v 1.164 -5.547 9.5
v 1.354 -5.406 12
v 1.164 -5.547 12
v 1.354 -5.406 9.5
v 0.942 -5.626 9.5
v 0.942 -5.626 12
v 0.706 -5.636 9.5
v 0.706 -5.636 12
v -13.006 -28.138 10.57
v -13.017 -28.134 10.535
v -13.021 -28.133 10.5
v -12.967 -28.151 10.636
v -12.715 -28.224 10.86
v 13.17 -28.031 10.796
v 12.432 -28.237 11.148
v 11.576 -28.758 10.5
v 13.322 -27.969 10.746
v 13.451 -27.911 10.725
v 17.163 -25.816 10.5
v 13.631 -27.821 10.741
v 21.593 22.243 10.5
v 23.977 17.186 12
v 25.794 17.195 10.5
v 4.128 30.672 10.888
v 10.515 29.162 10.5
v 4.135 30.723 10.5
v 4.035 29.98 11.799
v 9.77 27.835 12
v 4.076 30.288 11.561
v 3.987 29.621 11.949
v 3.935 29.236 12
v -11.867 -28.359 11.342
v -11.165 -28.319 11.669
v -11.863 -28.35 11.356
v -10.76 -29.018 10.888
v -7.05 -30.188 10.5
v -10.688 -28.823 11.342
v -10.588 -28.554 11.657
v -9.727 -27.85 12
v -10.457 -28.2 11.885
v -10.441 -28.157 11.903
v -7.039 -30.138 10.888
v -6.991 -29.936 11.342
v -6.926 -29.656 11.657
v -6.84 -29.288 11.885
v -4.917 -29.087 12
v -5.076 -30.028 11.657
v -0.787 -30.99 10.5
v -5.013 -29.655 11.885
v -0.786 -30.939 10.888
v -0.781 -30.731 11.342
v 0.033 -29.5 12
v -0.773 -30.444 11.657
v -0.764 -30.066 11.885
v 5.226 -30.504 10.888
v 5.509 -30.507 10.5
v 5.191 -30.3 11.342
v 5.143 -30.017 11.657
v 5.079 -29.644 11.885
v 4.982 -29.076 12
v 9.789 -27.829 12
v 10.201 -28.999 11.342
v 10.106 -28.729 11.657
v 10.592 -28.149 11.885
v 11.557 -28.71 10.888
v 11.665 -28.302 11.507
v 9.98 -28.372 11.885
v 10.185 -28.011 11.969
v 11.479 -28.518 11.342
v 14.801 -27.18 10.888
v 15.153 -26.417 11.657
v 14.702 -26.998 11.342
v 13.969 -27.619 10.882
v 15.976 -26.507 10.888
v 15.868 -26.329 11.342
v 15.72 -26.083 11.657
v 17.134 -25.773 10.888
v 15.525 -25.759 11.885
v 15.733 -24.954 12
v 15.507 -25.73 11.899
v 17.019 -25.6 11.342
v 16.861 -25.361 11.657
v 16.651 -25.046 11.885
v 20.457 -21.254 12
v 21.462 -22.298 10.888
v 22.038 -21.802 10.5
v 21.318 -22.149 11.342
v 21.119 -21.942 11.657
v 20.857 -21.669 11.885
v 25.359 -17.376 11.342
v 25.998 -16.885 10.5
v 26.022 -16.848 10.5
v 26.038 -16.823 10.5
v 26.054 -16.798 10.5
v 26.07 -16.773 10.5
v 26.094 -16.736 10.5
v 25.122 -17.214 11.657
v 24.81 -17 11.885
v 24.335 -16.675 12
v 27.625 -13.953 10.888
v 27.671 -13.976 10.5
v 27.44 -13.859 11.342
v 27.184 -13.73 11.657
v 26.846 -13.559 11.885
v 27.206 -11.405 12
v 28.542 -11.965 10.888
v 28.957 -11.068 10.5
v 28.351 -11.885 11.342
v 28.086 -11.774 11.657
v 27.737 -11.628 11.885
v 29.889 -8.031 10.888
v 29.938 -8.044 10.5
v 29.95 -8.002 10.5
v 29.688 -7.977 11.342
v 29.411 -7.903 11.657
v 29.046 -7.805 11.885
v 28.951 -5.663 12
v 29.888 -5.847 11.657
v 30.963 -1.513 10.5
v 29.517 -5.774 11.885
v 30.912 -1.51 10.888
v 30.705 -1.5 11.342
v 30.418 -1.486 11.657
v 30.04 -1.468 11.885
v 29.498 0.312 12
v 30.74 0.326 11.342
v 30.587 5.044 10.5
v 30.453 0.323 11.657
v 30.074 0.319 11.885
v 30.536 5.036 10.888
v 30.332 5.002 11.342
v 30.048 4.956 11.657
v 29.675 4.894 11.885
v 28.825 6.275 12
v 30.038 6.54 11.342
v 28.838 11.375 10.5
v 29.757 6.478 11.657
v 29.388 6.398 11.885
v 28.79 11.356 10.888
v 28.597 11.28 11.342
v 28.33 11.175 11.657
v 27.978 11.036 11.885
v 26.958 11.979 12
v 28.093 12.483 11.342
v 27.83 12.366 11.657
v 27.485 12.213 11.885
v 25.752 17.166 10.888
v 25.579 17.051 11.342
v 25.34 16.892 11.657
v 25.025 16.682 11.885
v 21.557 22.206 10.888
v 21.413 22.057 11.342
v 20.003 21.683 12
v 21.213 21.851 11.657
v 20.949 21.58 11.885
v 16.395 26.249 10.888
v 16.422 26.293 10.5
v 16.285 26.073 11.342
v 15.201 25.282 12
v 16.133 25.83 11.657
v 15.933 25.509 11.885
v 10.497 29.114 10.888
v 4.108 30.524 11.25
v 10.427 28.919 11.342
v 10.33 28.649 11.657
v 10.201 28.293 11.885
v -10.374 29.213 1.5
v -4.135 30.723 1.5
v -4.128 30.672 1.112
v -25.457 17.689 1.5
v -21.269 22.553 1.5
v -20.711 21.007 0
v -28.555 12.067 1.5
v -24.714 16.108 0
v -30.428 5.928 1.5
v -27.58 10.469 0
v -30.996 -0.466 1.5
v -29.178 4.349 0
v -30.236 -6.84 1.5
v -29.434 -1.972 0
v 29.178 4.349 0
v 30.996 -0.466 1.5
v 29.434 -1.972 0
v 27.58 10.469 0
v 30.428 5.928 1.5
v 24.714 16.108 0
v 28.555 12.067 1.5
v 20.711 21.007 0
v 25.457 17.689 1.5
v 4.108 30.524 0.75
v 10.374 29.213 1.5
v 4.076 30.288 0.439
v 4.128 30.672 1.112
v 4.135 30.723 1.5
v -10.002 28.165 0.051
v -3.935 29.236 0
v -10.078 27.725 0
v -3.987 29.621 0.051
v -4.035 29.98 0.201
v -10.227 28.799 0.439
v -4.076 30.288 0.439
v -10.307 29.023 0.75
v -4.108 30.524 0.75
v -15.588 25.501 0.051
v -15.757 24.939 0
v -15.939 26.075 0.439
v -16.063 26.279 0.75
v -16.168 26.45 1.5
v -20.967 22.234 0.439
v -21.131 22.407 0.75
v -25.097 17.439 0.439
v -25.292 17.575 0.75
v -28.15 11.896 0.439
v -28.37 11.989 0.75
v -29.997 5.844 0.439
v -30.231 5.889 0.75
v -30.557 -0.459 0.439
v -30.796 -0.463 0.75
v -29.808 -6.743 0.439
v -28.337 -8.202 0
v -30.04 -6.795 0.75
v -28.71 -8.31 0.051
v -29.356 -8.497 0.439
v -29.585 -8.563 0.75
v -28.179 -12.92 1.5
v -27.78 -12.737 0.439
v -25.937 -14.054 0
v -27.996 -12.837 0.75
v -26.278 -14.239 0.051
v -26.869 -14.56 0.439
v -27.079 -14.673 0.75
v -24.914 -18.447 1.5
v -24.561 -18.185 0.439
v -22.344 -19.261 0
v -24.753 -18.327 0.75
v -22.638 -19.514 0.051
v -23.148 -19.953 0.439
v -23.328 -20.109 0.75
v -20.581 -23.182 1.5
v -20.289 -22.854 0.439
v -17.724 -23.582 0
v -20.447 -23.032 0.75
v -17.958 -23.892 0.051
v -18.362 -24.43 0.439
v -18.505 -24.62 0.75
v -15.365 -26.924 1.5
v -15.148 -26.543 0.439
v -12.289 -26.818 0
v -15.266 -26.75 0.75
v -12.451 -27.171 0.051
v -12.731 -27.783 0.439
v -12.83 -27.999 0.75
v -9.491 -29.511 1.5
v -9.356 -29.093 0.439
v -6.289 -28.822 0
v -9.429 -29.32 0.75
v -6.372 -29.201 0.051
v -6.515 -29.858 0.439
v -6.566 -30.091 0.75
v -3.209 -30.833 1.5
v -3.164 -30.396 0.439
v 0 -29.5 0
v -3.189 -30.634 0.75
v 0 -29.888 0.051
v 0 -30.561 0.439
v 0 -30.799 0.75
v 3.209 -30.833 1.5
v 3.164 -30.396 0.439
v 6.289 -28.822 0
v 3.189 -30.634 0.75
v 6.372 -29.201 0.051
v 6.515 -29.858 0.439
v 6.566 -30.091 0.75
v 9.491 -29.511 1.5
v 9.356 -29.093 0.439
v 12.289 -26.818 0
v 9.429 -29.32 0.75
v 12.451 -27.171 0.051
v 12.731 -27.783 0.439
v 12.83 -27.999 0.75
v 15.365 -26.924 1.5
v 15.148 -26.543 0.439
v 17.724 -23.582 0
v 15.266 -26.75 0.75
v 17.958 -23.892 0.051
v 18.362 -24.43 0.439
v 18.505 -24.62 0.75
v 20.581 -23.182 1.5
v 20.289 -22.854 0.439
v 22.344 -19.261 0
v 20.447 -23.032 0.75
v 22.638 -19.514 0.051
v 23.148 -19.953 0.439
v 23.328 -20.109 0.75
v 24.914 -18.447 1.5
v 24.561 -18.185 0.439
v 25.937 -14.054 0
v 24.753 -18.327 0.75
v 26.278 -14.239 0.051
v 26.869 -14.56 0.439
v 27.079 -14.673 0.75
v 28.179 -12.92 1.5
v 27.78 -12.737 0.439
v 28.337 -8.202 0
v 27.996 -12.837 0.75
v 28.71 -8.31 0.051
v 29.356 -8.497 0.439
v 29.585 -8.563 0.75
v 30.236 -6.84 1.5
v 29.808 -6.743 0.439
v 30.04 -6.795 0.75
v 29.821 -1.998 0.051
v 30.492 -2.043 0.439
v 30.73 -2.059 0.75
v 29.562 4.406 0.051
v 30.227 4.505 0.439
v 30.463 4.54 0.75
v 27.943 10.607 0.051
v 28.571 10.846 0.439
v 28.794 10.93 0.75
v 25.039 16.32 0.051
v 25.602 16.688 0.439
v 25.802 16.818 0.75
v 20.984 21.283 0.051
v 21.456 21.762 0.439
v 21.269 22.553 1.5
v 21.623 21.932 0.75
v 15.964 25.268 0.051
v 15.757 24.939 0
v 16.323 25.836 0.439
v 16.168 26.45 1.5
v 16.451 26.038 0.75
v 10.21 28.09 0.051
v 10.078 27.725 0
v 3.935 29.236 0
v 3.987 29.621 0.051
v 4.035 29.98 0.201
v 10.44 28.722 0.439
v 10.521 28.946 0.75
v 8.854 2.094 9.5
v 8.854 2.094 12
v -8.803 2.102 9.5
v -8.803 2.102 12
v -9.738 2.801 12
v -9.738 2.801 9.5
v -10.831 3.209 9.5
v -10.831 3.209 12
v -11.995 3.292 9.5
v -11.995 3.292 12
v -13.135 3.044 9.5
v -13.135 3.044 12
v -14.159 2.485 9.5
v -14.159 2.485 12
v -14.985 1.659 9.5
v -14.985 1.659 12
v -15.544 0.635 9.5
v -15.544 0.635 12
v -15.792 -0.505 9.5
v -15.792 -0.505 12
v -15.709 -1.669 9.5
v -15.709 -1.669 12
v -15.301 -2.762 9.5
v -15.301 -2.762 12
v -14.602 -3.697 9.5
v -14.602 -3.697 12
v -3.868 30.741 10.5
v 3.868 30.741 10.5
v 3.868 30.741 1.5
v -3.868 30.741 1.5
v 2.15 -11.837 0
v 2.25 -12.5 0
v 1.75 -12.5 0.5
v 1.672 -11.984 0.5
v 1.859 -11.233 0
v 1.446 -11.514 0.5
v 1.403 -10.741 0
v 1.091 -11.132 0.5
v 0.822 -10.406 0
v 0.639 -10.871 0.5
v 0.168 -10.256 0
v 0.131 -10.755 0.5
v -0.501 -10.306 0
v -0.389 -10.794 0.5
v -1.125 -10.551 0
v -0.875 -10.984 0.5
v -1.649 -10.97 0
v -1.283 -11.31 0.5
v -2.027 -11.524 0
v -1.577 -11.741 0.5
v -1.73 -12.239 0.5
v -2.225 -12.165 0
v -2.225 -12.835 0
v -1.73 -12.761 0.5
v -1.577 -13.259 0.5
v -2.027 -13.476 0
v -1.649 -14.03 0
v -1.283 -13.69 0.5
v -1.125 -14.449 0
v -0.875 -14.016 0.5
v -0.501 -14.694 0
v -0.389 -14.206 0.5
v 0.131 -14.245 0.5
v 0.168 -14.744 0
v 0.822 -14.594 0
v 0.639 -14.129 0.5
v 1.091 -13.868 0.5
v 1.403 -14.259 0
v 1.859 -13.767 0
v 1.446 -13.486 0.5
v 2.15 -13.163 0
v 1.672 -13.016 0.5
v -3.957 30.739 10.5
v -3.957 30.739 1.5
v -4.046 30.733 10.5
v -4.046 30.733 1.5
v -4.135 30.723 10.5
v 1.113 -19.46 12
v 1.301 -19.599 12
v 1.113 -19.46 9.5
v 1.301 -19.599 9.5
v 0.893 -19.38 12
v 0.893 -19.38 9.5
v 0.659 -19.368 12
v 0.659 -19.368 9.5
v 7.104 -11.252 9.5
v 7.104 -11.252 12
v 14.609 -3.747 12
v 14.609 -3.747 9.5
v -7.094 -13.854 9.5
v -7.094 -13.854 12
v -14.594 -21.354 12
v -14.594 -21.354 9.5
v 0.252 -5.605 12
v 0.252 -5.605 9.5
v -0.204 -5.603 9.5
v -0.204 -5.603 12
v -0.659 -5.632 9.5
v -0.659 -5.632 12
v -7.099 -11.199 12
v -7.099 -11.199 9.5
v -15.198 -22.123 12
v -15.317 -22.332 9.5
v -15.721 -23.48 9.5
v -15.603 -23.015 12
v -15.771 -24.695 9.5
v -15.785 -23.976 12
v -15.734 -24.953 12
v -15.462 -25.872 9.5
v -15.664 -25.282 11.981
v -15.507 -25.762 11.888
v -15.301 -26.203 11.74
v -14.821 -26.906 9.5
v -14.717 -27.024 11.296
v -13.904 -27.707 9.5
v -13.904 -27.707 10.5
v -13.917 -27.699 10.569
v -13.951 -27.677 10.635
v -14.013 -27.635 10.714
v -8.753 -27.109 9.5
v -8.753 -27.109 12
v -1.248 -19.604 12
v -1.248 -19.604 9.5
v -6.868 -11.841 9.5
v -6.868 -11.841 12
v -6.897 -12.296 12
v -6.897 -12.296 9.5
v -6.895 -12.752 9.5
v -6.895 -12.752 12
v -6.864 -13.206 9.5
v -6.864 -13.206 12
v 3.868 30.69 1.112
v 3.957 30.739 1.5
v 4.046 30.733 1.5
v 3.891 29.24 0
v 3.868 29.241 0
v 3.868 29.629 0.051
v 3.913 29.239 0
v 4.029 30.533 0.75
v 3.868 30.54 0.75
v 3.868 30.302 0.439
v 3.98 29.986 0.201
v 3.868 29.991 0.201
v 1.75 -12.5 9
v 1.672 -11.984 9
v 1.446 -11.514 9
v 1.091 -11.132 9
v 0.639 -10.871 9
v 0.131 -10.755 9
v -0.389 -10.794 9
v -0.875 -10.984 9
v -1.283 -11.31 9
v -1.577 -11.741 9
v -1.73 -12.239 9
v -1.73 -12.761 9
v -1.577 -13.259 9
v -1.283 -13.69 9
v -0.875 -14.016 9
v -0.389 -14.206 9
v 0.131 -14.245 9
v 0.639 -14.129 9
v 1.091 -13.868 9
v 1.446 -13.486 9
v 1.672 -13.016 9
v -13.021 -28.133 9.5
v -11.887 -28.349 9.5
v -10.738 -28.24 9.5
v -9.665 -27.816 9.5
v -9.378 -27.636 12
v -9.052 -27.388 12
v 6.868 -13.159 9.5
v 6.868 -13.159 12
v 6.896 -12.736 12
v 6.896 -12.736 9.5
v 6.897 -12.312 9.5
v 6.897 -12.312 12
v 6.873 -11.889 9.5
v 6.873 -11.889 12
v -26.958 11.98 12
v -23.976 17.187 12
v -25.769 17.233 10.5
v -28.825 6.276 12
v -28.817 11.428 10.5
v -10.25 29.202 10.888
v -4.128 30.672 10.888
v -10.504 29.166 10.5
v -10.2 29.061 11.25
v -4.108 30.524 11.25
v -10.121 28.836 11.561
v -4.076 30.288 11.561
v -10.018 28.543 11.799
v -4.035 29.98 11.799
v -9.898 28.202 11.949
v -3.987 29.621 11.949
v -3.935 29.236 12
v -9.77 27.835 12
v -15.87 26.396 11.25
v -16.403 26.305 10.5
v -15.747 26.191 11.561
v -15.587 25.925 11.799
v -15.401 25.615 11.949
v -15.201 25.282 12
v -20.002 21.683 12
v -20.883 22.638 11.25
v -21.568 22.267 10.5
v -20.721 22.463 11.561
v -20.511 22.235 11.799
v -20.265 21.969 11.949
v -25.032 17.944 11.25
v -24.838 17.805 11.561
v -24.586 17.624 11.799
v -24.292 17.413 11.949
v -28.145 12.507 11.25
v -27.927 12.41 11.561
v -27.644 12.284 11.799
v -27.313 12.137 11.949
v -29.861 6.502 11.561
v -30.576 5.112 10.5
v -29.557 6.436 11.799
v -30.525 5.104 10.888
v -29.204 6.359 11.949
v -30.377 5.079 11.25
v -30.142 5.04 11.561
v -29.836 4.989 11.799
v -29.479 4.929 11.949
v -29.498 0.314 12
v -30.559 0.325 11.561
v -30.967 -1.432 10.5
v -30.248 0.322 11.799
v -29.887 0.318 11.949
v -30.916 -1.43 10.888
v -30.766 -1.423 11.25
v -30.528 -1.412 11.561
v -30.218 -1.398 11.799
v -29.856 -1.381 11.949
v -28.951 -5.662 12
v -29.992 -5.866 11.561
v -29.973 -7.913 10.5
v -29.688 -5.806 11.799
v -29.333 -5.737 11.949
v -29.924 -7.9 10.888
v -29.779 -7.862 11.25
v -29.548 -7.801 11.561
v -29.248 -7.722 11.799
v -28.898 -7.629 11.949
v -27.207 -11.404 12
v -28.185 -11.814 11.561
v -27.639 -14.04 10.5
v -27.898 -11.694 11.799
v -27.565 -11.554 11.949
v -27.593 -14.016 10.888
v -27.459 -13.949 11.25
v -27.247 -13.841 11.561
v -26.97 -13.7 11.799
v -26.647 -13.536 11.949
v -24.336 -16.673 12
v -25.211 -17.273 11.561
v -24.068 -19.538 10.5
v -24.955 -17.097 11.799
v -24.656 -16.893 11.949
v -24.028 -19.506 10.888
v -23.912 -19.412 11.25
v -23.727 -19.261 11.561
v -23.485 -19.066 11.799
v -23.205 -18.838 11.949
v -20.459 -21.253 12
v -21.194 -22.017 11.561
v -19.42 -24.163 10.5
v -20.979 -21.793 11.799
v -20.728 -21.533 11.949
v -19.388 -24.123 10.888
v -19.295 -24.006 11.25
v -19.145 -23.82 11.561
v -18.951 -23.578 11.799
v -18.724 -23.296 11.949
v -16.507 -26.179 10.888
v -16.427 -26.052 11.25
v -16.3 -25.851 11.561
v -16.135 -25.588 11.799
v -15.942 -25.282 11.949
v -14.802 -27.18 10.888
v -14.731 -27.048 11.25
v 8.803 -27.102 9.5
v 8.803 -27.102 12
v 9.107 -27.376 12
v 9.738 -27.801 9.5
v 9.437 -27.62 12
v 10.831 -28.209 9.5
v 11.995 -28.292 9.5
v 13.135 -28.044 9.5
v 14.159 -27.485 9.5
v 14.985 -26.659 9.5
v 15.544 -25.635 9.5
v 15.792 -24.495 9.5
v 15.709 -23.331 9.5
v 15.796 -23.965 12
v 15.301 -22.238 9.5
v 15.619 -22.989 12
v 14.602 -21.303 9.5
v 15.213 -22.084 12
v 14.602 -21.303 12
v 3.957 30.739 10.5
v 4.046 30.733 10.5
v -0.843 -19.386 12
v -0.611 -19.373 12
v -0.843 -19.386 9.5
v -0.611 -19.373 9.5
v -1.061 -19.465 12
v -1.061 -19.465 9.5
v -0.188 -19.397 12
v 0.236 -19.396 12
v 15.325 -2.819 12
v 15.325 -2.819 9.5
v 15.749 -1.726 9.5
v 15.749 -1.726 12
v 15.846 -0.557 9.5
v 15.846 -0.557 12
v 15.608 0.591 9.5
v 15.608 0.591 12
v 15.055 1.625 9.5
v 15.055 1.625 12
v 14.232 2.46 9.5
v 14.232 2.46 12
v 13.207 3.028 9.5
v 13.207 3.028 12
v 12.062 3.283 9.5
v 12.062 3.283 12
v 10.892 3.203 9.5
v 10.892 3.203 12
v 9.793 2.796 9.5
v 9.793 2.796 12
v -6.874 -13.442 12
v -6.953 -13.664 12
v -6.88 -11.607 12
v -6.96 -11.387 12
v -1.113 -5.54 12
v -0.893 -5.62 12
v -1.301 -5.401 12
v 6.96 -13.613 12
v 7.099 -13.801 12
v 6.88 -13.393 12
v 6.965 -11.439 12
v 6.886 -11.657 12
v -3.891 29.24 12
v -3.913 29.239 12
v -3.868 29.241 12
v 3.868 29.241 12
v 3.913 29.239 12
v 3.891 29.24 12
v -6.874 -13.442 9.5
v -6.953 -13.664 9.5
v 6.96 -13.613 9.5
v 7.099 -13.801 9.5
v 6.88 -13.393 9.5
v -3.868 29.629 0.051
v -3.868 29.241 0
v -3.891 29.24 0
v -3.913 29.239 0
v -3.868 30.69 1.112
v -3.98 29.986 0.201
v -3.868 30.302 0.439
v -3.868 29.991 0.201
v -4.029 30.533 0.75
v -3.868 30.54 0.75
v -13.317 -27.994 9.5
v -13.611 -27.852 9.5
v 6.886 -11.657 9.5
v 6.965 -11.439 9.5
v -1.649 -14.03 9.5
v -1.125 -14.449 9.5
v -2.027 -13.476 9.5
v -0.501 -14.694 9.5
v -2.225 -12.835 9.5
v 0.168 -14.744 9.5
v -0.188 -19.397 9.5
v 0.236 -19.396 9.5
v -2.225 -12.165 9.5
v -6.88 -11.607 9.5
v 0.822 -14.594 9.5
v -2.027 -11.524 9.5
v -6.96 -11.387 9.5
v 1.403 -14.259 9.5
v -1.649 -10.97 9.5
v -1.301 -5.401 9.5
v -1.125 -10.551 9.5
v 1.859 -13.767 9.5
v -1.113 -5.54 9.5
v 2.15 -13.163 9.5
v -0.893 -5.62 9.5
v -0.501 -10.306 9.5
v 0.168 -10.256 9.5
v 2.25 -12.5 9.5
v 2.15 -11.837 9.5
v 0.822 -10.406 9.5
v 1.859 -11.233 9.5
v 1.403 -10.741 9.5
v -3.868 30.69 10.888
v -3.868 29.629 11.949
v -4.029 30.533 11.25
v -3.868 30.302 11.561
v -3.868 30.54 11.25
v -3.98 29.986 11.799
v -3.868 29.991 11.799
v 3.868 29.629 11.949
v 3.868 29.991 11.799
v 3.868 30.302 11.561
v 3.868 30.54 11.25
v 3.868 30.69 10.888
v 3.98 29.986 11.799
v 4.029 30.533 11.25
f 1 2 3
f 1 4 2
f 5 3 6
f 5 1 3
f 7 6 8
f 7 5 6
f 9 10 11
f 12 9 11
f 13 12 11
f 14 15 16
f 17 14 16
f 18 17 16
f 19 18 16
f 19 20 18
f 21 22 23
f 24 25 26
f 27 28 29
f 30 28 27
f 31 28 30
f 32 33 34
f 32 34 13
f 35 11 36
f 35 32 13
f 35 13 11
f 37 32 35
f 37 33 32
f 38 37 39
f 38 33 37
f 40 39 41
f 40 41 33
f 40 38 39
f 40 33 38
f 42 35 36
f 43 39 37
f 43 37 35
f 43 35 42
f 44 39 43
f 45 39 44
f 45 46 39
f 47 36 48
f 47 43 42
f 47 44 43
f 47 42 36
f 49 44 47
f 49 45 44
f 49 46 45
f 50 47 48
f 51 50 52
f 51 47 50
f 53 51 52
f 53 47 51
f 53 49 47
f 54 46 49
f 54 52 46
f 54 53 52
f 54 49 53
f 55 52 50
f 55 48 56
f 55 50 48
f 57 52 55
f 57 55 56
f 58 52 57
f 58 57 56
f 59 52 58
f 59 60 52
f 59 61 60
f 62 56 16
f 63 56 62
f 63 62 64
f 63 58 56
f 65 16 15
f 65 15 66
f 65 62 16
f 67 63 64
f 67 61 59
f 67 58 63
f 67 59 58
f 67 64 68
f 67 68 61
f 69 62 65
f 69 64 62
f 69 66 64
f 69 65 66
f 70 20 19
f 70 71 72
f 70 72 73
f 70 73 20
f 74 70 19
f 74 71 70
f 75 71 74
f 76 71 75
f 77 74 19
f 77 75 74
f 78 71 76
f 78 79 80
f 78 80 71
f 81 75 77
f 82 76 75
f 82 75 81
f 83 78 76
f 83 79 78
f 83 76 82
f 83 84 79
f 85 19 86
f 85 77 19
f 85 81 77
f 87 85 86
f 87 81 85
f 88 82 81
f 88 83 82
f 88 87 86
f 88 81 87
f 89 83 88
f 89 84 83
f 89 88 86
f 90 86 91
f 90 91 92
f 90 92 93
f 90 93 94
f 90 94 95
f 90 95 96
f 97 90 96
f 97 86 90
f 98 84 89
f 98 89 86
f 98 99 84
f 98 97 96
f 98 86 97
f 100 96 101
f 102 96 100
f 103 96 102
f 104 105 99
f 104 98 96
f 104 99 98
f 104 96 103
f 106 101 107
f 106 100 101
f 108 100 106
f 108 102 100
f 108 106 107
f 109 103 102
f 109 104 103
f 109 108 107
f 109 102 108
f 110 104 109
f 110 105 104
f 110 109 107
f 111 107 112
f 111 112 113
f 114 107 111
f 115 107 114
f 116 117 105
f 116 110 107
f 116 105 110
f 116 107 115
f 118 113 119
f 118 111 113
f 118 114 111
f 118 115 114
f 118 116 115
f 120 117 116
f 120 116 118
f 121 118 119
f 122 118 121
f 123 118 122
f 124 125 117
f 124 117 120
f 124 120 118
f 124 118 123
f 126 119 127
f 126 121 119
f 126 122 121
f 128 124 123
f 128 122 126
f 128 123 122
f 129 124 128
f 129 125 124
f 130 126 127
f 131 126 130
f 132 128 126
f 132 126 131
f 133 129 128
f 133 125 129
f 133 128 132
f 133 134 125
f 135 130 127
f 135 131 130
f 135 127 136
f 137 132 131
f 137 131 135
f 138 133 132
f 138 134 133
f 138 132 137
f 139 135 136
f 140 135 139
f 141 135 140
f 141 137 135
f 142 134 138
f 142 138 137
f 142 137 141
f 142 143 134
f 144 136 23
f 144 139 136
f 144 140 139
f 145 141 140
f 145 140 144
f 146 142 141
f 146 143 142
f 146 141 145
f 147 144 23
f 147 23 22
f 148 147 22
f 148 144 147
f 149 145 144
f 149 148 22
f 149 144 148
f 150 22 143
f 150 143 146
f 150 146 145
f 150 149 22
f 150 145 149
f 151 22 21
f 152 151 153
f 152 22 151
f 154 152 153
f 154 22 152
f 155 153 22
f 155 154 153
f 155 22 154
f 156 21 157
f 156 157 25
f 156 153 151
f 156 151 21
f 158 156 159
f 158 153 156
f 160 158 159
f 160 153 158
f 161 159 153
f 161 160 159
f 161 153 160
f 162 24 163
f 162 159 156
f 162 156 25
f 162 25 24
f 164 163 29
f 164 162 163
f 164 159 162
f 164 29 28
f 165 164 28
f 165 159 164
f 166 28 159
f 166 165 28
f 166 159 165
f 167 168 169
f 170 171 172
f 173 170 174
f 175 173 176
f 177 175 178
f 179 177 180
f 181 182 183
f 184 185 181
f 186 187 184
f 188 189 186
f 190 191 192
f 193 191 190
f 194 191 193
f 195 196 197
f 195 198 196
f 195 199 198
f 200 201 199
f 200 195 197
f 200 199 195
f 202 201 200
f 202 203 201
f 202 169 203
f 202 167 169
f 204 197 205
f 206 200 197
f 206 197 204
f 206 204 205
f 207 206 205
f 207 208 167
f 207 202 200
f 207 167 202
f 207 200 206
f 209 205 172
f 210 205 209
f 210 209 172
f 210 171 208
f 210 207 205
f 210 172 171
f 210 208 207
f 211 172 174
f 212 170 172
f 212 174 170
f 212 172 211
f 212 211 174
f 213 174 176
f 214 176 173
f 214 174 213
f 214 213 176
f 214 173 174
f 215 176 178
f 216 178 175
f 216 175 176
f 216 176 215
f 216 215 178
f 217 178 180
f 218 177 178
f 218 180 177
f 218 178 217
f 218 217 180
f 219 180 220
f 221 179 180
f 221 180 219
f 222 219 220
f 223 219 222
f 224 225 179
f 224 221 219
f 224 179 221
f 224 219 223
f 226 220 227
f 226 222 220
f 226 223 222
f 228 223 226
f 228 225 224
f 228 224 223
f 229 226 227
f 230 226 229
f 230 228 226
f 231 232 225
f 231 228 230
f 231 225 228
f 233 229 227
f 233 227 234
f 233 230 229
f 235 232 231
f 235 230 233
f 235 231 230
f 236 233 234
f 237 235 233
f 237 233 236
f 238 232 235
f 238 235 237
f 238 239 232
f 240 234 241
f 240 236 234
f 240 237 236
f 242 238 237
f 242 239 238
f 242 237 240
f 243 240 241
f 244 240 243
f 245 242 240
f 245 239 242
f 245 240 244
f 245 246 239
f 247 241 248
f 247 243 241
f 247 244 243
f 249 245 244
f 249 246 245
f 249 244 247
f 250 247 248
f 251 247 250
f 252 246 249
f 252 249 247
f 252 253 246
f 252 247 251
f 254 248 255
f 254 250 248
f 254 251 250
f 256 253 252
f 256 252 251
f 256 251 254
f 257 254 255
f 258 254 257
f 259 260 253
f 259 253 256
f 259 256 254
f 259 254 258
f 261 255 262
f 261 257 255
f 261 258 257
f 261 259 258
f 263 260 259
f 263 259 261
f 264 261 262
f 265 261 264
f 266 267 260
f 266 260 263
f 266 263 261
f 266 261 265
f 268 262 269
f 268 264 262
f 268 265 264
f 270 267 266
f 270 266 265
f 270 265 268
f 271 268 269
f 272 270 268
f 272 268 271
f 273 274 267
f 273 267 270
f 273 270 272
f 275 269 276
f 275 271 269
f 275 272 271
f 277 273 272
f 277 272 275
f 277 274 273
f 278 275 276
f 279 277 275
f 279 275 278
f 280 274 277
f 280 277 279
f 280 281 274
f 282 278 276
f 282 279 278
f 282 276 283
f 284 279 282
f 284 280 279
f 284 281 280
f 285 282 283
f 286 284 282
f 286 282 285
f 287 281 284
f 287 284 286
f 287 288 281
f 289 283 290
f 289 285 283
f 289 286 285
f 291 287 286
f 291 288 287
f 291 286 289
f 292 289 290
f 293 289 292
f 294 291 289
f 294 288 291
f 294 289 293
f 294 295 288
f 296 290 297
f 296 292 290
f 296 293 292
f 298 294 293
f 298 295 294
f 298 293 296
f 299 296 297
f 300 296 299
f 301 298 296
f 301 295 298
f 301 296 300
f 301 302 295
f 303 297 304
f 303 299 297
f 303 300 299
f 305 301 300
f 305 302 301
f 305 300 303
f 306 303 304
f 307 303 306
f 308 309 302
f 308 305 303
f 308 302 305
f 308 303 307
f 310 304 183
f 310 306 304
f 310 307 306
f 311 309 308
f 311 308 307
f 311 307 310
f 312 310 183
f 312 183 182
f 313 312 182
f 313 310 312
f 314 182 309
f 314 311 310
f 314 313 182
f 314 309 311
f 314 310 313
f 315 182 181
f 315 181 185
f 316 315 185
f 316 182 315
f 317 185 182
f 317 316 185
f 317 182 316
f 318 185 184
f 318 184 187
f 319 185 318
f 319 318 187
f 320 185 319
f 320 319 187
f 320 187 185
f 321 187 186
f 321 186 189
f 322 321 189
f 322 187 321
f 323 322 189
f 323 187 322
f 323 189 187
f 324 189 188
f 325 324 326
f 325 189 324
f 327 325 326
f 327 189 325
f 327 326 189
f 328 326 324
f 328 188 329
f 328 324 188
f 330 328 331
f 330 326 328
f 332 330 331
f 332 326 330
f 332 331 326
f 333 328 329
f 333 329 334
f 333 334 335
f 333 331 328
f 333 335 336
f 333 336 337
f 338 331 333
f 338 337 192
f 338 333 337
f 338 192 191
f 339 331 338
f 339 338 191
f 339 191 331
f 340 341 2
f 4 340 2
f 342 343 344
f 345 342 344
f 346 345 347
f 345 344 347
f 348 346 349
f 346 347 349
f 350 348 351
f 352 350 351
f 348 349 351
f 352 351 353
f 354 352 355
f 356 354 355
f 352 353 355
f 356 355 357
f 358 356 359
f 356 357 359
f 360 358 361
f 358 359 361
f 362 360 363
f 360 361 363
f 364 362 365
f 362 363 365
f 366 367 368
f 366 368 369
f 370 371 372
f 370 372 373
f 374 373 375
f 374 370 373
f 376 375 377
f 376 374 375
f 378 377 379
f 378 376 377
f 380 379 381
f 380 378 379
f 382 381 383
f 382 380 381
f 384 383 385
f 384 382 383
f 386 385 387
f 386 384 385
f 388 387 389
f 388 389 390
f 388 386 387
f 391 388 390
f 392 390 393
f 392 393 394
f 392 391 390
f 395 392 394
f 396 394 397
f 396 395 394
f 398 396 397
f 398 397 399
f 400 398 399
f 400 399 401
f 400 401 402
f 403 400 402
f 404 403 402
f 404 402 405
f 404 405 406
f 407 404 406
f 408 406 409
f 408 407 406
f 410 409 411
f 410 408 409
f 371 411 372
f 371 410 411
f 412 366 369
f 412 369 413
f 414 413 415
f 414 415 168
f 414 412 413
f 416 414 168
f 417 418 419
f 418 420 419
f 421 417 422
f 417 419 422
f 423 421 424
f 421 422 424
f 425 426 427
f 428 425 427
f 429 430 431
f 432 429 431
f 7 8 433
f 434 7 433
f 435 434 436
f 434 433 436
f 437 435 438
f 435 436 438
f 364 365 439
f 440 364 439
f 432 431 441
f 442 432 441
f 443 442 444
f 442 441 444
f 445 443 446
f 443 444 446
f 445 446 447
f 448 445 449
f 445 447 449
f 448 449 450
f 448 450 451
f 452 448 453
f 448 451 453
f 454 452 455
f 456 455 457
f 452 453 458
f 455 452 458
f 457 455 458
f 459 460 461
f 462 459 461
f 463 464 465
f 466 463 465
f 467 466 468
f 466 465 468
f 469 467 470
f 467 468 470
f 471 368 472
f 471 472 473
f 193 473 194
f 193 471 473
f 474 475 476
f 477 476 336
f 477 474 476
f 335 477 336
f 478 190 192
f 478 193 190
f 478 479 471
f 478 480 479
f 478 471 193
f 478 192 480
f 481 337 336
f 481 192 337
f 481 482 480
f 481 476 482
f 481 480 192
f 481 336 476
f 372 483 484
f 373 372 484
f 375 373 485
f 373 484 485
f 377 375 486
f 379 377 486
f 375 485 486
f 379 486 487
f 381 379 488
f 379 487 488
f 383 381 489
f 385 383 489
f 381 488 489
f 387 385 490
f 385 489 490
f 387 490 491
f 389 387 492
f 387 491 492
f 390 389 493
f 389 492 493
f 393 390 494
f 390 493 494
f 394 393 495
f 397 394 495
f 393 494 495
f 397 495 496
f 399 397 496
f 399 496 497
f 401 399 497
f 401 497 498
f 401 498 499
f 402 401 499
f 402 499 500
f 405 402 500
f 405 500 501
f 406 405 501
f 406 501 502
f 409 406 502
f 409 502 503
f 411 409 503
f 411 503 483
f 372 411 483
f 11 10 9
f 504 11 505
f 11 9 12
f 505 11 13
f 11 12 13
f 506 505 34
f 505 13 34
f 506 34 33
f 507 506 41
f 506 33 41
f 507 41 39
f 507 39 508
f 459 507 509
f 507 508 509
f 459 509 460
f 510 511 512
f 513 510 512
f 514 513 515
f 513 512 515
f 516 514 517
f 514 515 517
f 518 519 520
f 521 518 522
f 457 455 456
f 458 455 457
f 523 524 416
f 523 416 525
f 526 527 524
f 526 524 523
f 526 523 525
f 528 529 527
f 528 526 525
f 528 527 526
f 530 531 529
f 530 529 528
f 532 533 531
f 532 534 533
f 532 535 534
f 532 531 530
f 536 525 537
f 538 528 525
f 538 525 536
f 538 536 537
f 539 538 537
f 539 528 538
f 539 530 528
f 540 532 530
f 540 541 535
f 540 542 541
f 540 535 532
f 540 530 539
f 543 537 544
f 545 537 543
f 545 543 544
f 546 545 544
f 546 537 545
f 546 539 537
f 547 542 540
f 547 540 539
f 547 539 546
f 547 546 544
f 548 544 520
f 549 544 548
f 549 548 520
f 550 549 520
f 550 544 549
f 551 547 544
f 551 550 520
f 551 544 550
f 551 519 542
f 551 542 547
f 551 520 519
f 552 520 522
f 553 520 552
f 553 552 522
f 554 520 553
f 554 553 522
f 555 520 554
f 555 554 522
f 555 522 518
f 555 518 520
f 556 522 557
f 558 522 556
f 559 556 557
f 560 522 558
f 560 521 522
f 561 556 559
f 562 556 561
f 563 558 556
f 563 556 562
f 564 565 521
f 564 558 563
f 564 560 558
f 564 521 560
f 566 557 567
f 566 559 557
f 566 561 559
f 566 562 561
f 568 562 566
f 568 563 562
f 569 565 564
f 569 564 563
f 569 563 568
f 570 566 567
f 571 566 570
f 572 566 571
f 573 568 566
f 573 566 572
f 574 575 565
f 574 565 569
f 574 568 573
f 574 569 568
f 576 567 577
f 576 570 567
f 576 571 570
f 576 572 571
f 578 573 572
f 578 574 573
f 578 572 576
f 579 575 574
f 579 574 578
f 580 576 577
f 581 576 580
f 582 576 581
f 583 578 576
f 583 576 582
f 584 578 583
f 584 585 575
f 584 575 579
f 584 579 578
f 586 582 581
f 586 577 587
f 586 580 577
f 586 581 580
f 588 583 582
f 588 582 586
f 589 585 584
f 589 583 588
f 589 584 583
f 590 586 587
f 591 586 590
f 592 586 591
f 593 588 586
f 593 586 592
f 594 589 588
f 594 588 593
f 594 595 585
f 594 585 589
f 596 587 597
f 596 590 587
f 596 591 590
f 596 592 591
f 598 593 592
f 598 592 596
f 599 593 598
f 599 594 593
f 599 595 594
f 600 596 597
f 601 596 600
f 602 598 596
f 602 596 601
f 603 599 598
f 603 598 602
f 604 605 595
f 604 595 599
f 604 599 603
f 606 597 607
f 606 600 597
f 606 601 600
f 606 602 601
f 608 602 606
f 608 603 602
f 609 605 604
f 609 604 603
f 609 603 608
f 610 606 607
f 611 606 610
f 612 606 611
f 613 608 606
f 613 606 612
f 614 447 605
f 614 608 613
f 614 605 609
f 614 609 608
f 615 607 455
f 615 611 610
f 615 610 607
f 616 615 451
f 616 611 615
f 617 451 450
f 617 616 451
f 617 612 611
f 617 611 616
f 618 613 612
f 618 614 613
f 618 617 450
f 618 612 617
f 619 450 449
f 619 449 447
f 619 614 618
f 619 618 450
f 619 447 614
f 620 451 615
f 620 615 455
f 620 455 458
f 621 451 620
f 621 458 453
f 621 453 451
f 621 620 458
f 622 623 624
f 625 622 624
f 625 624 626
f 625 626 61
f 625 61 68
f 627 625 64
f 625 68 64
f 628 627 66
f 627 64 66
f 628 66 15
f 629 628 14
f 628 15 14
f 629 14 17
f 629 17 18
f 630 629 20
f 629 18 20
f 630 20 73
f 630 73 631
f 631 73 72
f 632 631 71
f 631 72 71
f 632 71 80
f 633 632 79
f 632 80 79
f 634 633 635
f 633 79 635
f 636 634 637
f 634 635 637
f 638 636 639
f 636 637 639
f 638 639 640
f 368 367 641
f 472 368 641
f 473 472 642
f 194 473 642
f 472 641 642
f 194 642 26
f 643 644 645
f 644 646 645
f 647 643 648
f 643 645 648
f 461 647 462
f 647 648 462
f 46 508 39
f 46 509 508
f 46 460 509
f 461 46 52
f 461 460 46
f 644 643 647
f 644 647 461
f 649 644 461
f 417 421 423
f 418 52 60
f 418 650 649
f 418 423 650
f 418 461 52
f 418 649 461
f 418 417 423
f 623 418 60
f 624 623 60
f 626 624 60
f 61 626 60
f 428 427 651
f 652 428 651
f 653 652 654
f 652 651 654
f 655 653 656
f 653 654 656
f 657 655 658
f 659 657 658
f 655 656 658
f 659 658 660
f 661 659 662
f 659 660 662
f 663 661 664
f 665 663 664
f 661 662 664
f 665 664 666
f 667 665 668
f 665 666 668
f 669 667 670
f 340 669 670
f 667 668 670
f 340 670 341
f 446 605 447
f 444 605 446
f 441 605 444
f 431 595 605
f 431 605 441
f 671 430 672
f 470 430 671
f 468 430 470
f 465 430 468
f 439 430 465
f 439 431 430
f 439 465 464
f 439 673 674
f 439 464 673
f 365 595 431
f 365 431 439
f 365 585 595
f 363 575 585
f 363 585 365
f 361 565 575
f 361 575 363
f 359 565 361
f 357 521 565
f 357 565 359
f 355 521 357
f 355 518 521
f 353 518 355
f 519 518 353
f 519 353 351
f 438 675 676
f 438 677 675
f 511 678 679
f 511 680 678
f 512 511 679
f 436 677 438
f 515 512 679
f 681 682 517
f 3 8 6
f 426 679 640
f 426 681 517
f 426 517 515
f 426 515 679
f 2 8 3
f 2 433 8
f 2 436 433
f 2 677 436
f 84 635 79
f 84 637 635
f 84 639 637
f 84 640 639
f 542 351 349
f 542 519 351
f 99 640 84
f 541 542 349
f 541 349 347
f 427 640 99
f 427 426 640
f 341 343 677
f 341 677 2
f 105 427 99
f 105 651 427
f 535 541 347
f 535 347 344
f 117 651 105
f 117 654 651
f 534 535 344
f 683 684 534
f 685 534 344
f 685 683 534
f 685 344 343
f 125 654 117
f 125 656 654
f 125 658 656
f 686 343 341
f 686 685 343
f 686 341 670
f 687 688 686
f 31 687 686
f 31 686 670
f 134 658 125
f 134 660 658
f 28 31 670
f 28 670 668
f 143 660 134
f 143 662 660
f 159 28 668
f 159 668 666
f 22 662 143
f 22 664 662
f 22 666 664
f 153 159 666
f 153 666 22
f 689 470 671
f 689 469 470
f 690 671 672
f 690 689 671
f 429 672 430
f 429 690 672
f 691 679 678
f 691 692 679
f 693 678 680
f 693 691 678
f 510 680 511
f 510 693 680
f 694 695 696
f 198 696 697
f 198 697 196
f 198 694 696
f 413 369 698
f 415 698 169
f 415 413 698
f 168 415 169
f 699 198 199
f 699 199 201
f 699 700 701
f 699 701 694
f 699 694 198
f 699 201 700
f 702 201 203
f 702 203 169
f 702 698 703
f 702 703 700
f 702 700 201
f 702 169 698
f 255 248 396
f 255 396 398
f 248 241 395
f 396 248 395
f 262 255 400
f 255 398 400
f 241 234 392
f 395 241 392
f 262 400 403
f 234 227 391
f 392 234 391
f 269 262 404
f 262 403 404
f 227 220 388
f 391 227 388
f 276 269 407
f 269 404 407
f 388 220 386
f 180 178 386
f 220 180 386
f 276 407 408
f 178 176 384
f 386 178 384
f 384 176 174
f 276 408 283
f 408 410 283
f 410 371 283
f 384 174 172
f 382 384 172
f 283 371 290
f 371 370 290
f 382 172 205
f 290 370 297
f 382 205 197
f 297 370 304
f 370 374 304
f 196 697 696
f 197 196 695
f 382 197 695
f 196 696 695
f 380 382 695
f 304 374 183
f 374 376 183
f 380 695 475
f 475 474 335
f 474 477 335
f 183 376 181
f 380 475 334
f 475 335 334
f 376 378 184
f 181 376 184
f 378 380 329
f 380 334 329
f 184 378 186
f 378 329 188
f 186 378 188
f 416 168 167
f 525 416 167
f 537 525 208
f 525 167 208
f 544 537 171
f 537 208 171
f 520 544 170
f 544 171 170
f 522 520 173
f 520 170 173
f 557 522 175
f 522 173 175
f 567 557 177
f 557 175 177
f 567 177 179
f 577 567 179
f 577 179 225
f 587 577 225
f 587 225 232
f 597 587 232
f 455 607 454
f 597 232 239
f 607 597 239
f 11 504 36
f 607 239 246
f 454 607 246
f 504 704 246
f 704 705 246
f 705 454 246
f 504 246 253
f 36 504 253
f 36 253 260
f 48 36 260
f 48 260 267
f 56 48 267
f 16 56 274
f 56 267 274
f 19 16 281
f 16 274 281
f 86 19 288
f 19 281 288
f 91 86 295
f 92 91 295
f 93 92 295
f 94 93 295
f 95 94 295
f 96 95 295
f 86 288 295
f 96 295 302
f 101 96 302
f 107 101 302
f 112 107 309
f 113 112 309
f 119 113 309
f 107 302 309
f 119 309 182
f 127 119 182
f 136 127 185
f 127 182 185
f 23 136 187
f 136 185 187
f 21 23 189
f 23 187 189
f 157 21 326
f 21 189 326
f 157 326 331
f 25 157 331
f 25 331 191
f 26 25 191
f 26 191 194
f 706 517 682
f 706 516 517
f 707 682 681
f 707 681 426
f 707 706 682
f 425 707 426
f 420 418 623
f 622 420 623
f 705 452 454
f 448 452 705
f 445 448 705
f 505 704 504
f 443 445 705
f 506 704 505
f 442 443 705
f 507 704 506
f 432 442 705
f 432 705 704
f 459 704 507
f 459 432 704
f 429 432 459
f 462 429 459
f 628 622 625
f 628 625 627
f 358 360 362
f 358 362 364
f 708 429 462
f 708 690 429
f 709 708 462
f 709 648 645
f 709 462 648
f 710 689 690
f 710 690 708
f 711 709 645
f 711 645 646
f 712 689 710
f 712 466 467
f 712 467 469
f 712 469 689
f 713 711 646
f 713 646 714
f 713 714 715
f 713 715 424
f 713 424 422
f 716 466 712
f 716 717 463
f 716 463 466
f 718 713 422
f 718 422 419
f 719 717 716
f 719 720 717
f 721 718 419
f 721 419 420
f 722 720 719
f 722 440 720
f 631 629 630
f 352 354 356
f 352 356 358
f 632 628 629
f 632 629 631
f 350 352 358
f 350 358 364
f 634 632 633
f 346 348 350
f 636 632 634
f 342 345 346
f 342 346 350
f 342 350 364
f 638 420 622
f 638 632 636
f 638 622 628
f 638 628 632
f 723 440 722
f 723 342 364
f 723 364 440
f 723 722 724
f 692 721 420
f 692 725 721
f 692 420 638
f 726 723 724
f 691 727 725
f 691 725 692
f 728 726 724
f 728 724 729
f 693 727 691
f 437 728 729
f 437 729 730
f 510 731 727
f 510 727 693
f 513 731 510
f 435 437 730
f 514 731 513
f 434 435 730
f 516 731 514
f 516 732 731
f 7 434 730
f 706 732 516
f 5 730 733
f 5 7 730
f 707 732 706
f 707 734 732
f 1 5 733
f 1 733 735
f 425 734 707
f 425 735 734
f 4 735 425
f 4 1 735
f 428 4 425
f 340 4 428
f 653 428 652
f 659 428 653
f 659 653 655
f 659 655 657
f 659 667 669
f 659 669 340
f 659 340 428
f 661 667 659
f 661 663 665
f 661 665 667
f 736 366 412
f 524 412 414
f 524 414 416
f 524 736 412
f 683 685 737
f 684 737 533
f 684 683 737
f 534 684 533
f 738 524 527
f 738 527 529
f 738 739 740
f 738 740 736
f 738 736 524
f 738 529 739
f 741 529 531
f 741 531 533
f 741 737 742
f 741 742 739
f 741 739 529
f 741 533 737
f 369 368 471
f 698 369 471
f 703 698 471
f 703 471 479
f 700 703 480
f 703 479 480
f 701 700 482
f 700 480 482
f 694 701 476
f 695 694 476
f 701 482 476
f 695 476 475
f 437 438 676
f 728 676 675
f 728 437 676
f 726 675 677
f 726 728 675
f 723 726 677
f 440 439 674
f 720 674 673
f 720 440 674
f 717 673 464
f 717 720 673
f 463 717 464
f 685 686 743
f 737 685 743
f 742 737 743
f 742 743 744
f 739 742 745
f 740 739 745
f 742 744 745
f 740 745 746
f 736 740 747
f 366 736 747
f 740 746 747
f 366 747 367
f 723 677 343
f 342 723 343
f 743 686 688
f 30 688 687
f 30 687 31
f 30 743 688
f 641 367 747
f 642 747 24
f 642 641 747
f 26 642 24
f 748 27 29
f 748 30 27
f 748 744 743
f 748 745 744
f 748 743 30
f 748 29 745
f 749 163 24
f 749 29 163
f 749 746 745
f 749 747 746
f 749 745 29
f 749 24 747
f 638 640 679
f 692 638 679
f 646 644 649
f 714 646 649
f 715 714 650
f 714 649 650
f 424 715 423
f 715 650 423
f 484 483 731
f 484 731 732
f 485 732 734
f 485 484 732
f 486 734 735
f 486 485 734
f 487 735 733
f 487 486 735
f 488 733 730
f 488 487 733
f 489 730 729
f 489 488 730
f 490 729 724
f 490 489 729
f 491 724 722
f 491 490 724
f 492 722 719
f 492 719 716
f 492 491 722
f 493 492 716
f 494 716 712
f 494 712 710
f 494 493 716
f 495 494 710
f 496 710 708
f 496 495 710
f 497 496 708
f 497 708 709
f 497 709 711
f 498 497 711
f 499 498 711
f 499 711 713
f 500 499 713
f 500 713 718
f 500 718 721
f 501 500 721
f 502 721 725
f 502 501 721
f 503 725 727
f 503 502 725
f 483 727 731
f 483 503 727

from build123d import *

# Parameters (mm, degrees)
EXTRUDE_1_DEPTH     = 12
SKETCH_2_R          = 1.75
CUT_EXTRUDE_1_DEPTH = 46.453272709
CUT_EXTRUDE_2_DEPTH = 2.5
FILLET_2_R          = 2
FILLET_3_R          = 1.5
FILLET_5_R          = 0.8
CHAMFER_2_SIZE      = 0.5


with BuildPart() as part:
    # 草图1 → 凸台-拉伸1 (new body)
    with BuildSketch(Plane.XY):
        with BuildLine():
            Line((4, 30.740852298), (-4, 30.740852298))
            ThreePointArc((-4, 30.740852298), (0, -31), (4, 30.740852298))
        make_face()
    extrude(amount=EXTRUDE_1_DEPTH)

    # 草图2 → 切除-拉伸1 (cut, through all)
    with BuildSketch(Plane.XY.offset(12)):
        with Locations((0, -12.5)):
            Circle(SKETCH_2_R)
    extrude(amount=-CUT_EXTRUDE_1_DEPTH, mode=Mode.SUBTRACT)

    # 草图4 → 切除-拉伸2 (cut)
    with BuildSketch(Plane.XY.offset(12)):
        with BuildLine():
            Line((14.60159577, -21.303320164), (6.823421177, -13.525145571))
            ThreePointArc((6.823421177, -13.525145571), (6.899952258, -12.525667942), (6.83085934, -11.525648589))
            Line((6.83085934, -11.525648589), (14.609033933, -3.747473996))
            ThreePointArc((14.609033933, -3.747473996), (14.67380701, 2.072232238), (8.853780377, 2.09382366))
            Line((8.853780377, 2.09382366), (1.075605784, -5.684350934))
            ThreePointArc((1.075605784, -5.684350934), (0.025527626, -5.600047222), (-1.025145571, -5.676578823))
            Line((-1.025145571, -5.676578823), (-8.803320164, 2.10159577))
            ThreePointArc((-8.803320164, 2.10159577), (-14.60159577, 2.10159577), (-14.60159577, -3.696679836))
            Line((-14.60159577, -3.696679836), (-6.823421177, -11.474854429))
            ThreePointArc((-6.823421177, -11.474854429), (-6.899952778, -12.525527626), (-6.815649066, -13.575605784))
            Line((-6.815649066, -13.575605784), (-14.59382366, -21.353780377))
            ThreePointArc((-14.59382366, -21.353780377), (-14.572232238, -27.17380701), (-8.752526004, -27.109033933))
            Line((-8.752526004, -27.109033933), (-0.974351411, -19.33085934))
            ThreePointArc((-0.974351411, -19.33085934), (0.025667942, -19.399952258), (1.025145571, -19.323421177))
            Line((1.025145571, -19.323421177), (8.803320164, -27.10159577))
            ThreePointArc((8.803320164, -27.10159577), (14.60159577, -27.10159577), (14.60159577, -21.303320164))
        make_face()
    extrude(amount=-CUT_EXTRUDE_2_DEPTH, mode=Mode.SUBTRACT)

    # 圆角2
    fillet_2_edges = [part.edges().sort_by_distance(p)[0] for p in [
        (-4, 30.740852298, 6),
        (4, 30.740852298, 6),
    ]]
    fillet(fillet_2_edges, radius=FILLET_2_R)

    # 圆角3
    # the kernel refuses this fillet: 1.5 mm, written as the material it takes off along each edge
    with BuildSketch(Plane(origin=(0, 0, 12), x_dir=(-0.5266668059049125, -0.8500718061187049, 0), z_dir=(-0.8500718061187049, 0.5266668059049125, 0))) as fillet_3_piece_1:
        with BuildLine():
            CenterArc((31 - FILLET_3_R, -FILLET_3_R), FILLET_3_R, 0, 90)
            Line((31, -FILLET_3_R), (31, 0))
            Line((31, 0), (31 - FILLET_3_R, 0))
        make_face()
    revolve(axis=Axis((0, 0, 12), (0, 0, 1)), revolution_arc=204.115094482, mode=Mode.SUBTRACT)
    with BuildSketch(Plane(origin=(3.868256609, 30.740852298, 0), x_dir=(0, 0, 1), z_dir=(-1, 0, 0))) as fillet_3_piece_2:
        with BuildLine():
            CenterArc((FILLET_3_R, -FILLET_3_R), FILLET_3_R, 90, 90)
            Line((0, -FILLET_3_R), (0, 0))
            Line((0, 0), (FILLET_3_R, 0))
        make_face()
    extrude(amount=7.736513218, mode=Mode.SUBTRACT)
    with BuildSketch(Plane(origin=(3.868256609, 30.740852298, 12), x_dir=(0, 0, -1), z_dir=(-1, 0, 0))) as fillet_3_piece_3:
        with BuildLine():
            CenterArc((FILLET_3_R, FILLET_3_R), FILLET_3_R, 180, 90)
            Line((0, FILLET_3_R), (0, 0))
            Line((0, 0), (FILLET_3_R, 0))
        make_face()
    extrude(amount=7.736513218, mode=Mode.SUBTRACT)
    with BuildSketch(Plane(origin=(0, 0, 0), x_dir=(-0.1333881589240954, 0.991063872340648, 0), z_dir=(0.991063872340648, 0.1333881589240954, 0))) as fillet_3_piece_4:
        with BuildLine():
            CenterArc((31 - FILLET_3_R, FILLET_3_R), FILLET_3_R, 270, 90)
            Line((31, FILLET_3_R), (31, 0))
            Line((31, 0), (31 - FILLET_3_R, 0))
        make_face()
    revolve(axis=Axis((0, 0, 0), (0, 0, 1)), revolution_arc=344.669149504, mode=Mode.SUBTRACT)
    with BuildSketch(Plane(origin=(-3.868256609, 28.740852298, 0), x_dir=(0, 1, 0), z_dir=(1, 0, 0))) as fillet_3_piece_5:
        with BuildLine():
            CenterArc((2 - FILLET_3_R, FILLET_3_R), FILLET_3_R, 270, 90)
            Line((2, FILLET_3_R), (2, 0))
            Line((2, 0), (2 - FILLET_3_R, 0))
        make_face()
    revolve(axis=Axis((-3.868256609, 28.740852298, 0), (0, 0, 1)), revolution_arc=7.665425248, mode=Mode.SUBTRACT)
    with BuildSketch(Plane(origin=(3.868256609, 28.740852298, 0), x_dir=(0, 1, 0), z_dir=(-1, 0, 0))) as fillet_3_piece_6:
        with BuildLine():
            CenterArc((2 - FILLET_3_R, -FILLET_3_R), FILLET_3_R, 0, 90)
            Line((2, -FILLET_3_R), (2, 0))
            Line((2, 0), (2 - FILLET_3_R, 0))
        make_face()
    revolve(axis=Axis((3.868256609, 28.740852298, 0), (0, 0, -1)), revolution_arc=7.665425248, mode=Mode.SUBTRACT)
    with BuildSketch(Plane(origin=(0, 0, 12), x_dir=(-0.1333881589240954, 0.991063872340648, 0), z_dir=(0.991063872340648, 0.1333881589240954, 0))) as fillet_3_piece_7:
        with BuildLine():
            CenterArc((31 - FILLET_3_R, -FILLET_3_R), FILLET_3_R, 0, 90)
            Line((31, -FILLET_3_R), (31, 0))
            Line((31, 0), (31 - FILLET_3_R, 0))
        make_face()
    revolve(axis=Axis((0, 0, 12), (0, 0, 1)), revolution_arc=152.623466515, mode=Mode.SUBTRACT)
    with BuildSketch(Plane(origin=(-3.868256609, 28.740852298, 12), x_dir=(0, 1, 0), z_dir=(1, 0, 0))) as fillet_3_piece_8:
        with BuildLine():
            CenterArc((2 - FILLET_3_R, -FILLET_3_R), FILLET_3_R, 0, 90)
            Line((2 - FILLET_3_R, 0), (2, 0))
            Line((2, 0), (2, -FILLET_3_R))
        make_face()
    revolve(axis=Axis((-3.868256609, 28.740852298, 12), (0, 0, 1)), revolution_arc=7.665425248, mode=Mode.SUBTRACT)
    with BuildSketch(Plane(origin=(3.868256609, 28.740852298, 12), x_dir=(0, 1, 0), z_dir=(-1, 0, 0))) as fillet_3_piece_9:
        with BuildLine():
            CenterArc((2 - FILLET_3_R, FILLET_3_R), FILLET_3_R, 270, 90)
            Line((2 - FILLET_3_R, 0), (2, 0))
            Line((2, 0), (2, FILLET_3_R))
        make_face()
    revolve(axis=Axis((3.868256609, 28.740852298, 12), (0, 0, -1)), revolution_arc=7.665425248, mode=Mode.SUBTRACT)

    # 圆角5
    fillet_5_edges = [part.edges().sort_by_distance(p)[0] for p in [
        (6.83085934, -11.525648589, 10.75),
        (6.823421177, -13.525145571, 10.75),
        (1.025145571, -19.323421177, 10.75),
        (-0.974351411, -19.33085934, 10.75),
        (-6.815649066, -13.575605784, 10.75),
        (-6.823421177, -11.474854429, 10.75),
        (-1.025145571, -5.676578823, 10.75),
        (1.075605784, -5.684350934, 10.75),
    ]]
    fillet(fillet_5_edges, radius=FILLET_5_R)

    # 倒角2
    chamfer_2_edges = [part.edges().sort_by_distance(p)[0] for p in [
        (-1.75, -12.5, 0),
        (-1.75, -12.5, 9.5),
    ]]
    chamfer(chamfer_2_edges, length=CHAMFER_2_SIZE)


solid = part.part
